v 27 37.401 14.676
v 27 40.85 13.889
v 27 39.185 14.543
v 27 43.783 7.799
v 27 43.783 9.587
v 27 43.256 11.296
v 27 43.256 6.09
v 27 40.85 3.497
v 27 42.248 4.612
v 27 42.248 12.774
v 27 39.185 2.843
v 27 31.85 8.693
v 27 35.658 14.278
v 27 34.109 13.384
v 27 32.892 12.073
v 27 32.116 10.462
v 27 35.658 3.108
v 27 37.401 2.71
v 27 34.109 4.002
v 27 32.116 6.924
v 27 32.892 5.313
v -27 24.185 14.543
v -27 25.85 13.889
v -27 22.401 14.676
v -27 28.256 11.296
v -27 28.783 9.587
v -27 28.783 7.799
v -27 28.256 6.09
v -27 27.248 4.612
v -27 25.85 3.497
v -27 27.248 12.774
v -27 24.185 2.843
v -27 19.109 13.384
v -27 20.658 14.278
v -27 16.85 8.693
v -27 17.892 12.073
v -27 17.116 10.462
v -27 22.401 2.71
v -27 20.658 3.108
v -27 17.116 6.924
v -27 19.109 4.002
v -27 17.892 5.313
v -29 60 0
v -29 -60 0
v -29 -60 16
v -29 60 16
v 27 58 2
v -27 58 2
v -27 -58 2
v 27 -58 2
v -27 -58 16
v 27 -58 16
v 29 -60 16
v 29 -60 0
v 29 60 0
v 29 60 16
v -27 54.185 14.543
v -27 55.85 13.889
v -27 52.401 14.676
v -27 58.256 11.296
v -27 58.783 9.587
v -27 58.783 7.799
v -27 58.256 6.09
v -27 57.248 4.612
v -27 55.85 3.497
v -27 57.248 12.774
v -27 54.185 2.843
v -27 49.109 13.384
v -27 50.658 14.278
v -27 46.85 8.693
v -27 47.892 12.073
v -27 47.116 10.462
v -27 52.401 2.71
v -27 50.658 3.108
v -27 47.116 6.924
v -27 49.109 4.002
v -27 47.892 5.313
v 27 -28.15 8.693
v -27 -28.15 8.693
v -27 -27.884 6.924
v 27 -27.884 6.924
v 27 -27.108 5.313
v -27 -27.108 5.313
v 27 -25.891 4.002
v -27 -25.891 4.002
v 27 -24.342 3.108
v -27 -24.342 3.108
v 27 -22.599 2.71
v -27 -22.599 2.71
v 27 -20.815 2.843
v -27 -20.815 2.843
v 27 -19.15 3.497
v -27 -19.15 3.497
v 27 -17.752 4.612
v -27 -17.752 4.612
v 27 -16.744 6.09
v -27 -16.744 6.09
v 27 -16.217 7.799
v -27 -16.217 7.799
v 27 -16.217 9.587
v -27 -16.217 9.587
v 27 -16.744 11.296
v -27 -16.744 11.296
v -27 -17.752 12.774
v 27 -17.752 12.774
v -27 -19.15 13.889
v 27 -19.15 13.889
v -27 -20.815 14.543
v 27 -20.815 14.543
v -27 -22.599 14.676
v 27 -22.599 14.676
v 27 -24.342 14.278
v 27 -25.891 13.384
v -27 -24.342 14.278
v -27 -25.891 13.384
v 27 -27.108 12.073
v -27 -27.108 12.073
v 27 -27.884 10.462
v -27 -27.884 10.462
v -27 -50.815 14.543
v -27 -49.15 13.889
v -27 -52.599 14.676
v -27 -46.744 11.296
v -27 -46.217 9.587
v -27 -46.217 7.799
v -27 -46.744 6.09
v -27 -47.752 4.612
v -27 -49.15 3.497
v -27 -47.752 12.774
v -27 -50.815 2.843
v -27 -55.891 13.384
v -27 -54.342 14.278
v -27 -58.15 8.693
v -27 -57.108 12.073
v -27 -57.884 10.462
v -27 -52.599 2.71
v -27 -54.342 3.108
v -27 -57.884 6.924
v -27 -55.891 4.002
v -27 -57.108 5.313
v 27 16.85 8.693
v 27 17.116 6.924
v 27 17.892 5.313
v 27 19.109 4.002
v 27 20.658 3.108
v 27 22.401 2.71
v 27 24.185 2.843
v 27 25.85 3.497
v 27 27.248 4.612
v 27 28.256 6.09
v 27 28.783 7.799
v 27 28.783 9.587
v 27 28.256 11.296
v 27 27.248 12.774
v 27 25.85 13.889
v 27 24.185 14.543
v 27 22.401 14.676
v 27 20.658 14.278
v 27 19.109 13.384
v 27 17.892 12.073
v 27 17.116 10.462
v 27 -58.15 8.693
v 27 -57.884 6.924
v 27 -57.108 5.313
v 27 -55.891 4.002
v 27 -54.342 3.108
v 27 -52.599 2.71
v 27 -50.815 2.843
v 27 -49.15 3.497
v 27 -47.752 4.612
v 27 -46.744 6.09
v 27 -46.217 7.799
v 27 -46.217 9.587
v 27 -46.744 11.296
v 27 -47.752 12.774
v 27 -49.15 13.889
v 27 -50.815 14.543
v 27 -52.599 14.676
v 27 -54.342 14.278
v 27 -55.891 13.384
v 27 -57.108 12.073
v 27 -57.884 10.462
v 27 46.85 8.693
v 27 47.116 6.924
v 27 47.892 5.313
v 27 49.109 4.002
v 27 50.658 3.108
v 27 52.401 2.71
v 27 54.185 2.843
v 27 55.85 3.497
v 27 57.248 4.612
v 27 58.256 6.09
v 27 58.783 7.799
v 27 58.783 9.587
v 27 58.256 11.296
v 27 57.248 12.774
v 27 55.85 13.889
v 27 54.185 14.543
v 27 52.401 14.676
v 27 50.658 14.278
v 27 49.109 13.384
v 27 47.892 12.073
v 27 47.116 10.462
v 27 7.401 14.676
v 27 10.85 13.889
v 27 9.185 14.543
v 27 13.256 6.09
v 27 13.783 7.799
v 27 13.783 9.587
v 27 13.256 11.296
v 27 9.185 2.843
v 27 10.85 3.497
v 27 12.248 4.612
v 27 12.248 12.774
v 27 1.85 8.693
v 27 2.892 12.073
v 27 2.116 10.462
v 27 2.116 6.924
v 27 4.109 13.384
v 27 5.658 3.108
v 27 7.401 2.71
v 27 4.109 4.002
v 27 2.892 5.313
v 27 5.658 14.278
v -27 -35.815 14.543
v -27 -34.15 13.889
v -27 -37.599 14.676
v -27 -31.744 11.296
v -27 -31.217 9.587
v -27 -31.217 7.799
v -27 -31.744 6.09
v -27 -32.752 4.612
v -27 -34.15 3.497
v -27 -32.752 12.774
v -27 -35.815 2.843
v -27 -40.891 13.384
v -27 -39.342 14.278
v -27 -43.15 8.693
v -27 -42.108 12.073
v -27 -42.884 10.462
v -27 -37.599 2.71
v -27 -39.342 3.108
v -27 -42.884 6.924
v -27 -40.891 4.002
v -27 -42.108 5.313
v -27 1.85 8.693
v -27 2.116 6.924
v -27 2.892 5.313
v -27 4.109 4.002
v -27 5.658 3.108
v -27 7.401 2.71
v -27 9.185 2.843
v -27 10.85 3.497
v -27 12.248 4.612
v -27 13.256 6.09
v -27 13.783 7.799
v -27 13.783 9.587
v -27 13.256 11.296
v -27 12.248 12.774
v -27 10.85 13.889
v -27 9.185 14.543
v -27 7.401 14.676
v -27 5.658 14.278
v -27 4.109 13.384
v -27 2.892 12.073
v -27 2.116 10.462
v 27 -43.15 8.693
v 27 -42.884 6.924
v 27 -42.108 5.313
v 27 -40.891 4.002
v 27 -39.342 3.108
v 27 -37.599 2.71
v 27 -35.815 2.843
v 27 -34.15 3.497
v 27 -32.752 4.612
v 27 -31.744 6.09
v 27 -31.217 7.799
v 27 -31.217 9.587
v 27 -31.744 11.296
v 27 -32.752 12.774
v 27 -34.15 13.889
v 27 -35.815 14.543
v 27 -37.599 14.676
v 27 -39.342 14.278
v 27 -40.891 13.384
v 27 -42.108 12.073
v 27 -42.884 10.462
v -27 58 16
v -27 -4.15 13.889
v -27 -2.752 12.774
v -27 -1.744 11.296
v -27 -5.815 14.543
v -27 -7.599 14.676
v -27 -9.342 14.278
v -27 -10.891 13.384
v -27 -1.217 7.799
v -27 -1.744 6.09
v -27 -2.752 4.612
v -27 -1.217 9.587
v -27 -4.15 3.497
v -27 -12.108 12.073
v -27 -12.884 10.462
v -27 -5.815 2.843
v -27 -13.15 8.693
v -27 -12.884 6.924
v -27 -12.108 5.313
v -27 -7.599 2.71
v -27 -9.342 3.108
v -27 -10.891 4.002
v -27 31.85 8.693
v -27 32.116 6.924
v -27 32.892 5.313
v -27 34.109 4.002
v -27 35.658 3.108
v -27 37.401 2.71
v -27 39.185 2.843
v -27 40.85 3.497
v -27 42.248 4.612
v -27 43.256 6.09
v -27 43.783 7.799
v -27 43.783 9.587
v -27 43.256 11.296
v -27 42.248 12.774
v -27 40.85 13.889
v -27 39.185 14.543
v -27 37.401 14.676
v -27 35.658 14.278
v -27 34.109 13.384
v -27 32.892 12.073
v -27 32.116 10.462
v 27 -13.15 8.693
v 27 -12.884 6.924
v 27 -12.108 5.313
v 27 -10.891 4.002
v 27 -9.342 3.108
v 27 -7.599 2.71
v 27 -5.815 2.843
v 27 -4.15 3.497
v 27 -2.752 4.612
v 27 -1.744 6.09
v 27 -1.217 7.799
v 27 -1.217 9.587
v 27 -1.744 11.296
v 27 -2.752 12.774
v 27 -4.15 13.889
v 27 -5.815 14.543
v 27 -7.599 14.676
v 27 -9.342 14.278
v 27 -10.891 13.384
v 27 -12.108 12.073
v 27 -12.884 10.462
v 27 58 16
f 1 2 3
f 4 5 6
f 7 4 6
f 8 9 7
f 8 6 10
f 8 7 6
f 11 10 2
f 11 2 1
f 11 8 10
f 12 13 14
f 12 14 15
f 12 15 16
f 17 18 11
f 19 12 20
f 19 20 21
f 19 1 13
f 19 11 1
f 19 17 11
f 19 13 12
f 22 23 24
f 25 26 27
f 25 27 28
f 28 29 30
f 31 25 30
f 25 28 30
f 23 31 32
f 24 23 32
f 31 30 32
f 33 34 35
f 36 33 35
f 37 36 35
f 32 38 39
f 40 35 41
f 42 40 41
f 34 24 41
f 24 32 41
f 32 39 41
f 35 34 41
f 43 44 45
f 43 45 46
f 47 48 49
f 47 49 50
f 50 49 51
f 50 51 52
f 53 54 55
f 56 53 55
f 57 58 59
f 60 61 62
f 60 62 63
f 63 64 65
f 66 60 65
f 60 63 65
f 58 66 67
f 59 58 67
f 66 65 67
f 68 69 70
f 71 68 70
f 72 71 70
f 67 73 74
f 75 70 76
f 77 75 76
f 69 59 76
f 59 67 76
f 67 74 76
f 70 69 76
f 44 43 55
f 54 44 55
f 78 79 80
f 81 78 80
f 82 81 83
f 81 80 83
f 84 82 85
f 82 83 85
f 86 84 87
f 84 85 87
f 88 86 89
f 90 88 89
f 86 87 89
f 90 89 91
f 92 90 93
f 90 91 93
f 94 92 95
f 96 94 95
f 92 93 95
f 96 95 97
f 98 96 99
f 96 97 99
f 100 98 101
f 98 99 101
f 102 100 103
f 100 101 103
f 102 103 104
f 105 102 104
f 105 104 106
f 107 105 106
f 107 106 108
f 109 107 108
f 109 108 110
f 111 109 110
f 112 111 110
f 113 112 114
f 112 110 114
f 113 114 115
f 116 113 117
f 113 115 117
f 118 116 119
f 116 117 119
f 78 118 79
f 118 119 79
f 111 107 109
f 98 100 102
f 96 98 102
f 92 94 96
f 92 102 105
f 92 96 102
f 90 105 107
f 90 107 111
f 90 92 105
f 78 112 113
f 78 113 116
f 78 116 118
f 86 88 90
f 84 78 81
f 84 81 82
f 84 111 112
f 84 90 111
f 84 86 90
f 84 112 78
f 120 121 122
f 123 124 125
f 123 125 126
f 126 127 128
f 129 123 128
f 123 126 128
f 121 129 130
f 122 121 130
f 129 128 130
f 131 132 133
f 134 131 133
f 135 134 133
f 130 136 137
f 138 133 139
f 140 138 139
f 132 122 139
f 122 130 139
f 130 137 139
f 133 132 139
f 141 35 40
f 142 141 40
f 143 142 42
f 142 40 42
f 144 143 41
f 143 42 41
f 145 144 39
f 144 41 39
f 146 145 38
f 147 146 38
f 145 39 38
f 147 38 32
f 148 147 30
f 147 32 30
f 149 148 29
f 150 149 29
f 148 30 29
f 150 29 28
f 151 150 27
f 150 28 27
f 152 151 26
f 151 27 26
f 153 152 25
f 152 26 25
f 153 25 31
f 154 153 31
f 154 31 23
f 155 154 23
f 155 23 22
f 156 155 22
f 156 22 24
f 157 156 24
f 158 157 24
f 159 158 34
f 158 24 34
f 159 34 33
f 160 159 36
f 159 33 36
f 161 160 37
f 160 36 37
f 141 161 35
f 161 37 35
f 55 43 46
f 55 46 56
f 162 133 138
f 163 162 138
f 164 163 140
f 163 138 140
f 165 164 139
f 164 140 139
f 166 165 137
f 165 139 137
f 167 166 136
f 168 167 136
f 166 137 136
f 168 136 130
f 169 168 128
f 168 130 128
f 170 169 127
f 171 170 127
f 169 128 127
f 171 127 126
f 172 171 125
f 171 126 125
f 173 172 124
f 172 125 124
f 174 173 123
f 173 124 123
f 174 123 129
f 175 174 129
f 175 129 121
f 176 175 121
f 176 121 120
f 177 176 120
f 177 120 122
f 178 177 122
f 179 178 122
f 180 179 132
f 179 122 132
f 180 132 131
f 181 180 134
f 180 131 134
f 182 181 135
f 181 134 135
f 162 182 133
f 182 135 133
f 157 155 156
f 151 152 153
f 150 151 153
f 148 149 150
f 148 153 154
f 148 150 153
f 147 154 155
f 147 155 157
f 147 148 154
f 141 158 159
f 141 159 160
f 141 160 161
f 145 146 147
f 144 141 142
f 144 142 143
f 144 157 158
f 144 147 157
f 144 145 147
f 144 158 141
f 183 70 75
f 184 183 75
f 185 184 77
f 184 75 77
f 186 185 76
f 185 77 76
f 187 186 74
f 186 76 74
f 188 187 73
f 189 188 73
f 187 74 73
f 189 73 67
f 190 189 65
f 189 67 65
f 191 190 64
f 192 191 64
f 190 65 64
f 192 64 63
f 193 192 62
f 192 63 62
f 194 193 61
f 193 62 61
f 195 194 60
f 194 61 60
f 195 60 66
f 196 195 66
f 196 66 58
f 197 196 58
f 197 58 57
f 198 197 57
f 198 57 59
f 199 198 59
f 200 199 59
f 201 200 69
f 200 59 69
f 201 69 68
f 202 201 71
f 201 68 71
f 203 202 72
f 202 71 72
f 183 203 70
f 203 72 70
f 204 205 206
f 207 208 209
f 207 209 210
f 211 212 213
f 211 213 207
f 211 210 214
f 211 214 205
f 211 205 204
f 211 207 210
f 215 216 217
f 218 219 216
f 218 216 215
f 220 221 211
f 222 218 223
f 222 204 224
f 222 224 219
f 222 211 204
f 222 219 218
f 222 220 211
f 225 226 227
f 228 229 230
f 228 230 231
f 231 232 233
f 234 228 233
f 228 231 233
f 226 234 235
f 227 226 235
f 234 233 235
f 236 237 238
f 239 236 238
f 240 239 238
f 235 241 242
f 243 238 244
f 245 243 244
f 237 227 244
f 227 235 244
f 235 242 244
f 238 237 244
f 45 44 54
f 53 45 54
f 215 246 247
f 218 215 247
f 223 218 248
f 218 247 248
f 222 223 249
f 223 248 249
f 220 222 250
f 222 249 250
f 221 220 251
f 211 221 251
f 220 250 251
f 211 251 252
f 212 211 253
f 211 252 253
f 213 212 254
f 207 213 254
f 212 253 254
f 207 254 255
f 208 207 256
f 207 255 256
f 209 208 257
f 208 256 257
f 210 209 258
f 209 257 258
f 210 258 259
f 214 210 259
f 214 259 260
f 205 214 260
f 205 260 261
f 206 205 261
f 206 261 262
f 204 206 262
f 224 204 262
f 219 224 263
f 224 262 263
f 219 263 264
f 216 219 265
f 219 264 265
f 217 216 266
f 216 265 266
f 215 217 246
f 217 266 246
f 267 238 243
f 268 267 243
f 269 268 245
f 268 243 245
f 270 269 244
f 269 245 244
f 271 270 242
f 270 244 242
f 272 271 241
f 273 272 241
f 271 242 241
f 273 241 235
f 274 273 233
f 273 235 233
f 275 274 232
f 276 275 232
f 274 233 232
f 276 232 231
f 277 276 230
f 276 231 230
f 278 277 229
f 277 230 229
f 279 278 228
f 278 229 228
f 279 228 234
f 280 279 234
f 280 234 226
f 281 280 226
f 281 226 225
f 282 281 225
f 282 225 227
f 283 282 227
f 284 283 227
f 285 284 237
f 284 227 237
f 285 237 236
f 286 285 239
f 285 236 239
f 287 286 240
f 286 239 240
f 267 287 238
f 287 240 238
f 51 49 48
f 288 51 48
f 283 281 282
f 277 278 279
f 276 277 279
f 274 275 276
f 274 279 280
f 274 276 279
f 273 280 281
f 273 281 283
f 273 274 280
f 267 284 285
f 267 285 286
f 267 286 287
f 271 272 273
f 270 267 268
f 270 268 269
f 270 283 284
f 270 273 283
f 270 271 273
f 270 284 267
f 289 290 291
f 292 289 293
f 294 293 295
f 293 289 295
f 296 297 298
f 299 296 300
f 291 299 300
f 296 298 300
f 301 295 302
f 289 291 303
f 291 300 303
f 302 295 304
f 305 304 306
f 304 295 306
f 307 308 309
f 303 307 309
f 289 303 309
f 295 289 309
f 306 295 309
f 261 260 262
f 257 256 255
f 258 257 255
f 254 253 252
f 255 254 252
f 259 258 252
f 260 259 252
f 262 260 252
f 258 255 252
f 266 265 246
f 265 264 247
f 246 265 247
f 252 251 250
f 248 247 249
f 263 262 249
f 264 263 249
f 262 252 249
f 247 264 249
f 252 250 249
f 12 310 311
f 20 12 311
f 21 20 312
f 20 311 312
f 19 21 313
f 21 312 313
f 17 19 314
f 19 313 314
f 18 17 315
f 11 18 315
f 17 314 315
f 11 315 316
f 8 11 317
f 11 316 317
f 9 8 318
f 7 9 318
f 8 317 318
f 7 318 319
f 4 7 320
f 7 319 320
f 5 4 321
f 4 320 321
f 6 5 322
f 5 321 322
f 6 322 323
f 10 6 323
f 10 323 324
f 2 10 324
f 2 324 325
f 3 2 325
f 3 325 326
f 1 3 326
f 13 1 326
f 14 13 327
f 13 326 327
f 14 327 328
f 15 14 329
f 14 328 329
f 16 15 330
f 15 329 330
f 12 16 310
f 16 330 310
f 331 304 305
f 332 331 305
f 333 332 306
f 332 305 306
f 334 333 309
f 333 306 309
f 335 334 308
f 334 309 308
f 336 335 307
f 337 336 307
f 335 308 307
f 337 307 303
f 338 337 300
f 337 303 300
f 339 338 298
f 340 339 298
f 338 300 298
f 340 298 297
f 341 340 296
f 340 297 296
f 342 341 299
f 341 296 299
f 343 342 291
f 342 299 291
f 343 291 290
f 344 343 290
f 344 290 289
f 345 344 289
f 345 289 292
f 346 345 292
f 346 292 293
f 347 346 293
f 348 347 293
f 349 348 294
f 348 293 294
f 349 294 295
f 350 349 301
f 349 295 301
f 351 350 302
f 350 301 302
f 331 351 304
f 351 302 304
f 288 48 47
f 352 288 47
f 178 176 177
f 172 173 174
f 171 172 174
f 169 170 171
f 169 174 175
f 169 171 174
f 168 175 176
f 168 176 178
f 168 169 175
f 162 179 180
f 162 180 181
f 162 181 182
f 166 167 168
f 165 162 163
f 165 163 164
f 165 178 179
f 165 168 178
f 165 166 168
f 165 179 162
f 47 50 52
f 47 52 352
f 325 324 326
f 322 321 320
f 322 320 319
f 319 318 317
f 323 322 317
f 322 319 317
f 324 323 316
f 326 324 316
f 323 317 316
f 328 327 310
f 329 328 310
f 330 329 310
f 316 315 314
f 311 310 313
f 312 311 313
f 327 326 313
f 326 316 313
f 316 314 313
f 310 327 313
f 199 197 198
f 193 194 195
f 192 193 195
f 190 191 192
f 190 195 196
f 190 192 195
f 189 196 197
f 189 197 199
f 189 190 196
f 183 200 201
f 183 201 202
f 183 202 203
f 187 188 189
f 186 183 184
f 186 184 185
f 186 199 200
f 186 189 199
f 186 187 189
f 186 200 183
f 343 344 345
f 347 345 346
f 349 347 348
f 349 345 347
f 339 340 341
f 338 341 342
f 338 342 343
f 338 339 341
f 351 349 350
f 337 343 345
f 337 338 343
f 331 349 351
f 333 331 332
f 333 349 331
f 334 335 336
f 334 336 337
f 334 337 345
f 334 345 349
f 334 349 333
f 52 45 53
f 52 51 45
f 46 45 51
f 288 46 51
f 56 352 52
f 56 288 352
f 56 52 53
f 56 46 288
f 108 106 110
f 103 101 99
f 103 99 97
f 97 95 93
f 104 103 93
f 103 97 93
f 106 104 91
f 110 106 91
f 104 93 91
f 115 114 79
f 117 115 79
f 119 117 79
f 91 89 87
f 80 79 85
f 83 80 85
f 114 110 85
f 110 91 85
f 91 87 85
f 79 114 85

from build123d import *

# Parameters (mm, degrees)
IZIM1_W                       = 58
IZIM1_H                       = 120
Y_KSEKLIK_EKSTR_ZYON1_DEPTH   = 16
BO_ALTMA1_T                   = -2
IZIM2_R                       = 6
Y_KSEKLIK_EKSTR_ZYON2_DEPTH   = 54
Y_KSEKLIK_EKSTR_ZYON2_2_DEPTH = 54
Y_KSEKLIK_EKSTR_ZYON2_3_DEPTH = 54
Y_KSEKLIK_EKSTR_ZYON2_4_DEPTH = 54
Y_KSEKLIK_EKSTR_ZYON2_5_DEPTH = 54
Y_KSEKLIK_EKSTR_ZYON2_6_DEPTH = 54
Y_KSEKLIK_EKSTR_ZYON2_7_DEPTH = 54
Y_KSEKLIK_EKSTR_ZYON2_8_DEPTH = 54


with BuildPart() as part:
    # Çizim1 → Yükseklik-Ekstrüzyon1 (new body)
    with BuildSketch(Plane.XY):
        Rectangle(IZIM1_W, IZIM1_H)
    extrude(amount=Y_KSEKLIK_EKSTR_ZYON1_DEPTH)

    # İç Boşaltma1
    bo_altma1_openings = [part.faces().sort_by_distance(p)[0] for p in [
        (0, 0, 16),
    ]]
    offset(amount=BO_ALTMA1_T, openings=bo_altma1_openings, kind=Kind.INTERSECTION)


with BuildPart() as body_2:
    # Çizim2 → Yükseklik-Ekstrüzyon2 (new body)
    with BuildSketch(Plane(origin=(-27, 0, 0), x_dir=(0, 0, -1), z_dir=(1, 0, 0))):
        with Locations(Location((-8.693027198, -52.150296616, 0), (0, 0, 270))):
            Circle(IZIM2_R)
    extrude(amount=Y_KSEKLIK_EKSTR_ZYON2_DEPTH)


with BuildPart() as body_3:
    # Çizim2 → Y_kseklik-Ekstr_zyon2 2 (new body)
    with BuildSketch(Plane(origin=(-27, 0, 0), x_dir=(0, 0, -1), z_dir=(1, 0, 0))):
        with Locations(Location((-8.693027198, -37.150296616, 0), (0, 0, 270))):
            Circle(IZIM2_R)
    extrude(amount=Y_KSEKLIK_EKSTR_ZYON2_2_DEPTH)


with BuildPart() as body_4:
    # Çizim2 → Y_kseklik-Ekstr_zyon2 3 (new body)
    with BuildSketch(Plane(origin=(-27, 0, 0), x_dir=(0, 0, -1), z_dir=(1, 0, 0))):
        with Locations(Location((-8.693027198, -22.150296616, 0), (0, 0, 270))):
            Circle(IZIM2_R)
    extrude(amount=Y_KSEKLIK_EKSTR_ZYON2_3_DEPTH)


with BuildPart() as body_5:
    # Çizim2 → Y_kseklik-Ekstr_zyon2 4 (new body)
    with BuildSketch(Plane(origin=(-27, 0, 0), x_dir=(0, 0, -1), z_dir=(1, 0, 0))):
        with Locations(Location((-8.693027198, -7.150296616, 0), (0, 0, 270))):
            Circle(IZIM2_R)
    extrude(amount=Y_KSEKLIK_EKSTR_ZYON2_4_DEPTH)


with BuildPart() as body_6:
    # Çizim2 → Y_kseklik-Ekstr_zyon2 5 (new body)
    with BuildSketch(Plane(origin=(-27, 0, 0), x_dir=(0, 0, -1), z_dir=(1, 0, 0))):
        with Locations(Location((-8.693027198, 7.849703384, 0), (0, 0, 270))):
            Circle(IZIM2_R)
    extrude(amount=Y_KSEKLIK_EKSTR_ZYON2_5_DEPTH)


with BuildPart() as body_7:
    # Çizim2 → Y_kseklik-Ekstr_zyon2 6 (new body)
    with BuildSketch(Plane(origin=(-27, 0, 0), x_dir=(0, 0, -1), z_dir=(1, 0, 0))):
        with Locations(Location((-8.693027198, 22.849703384, 0), (0, 0, 270))):
            Circle(IZIM2_R)
    extrude(amount=Y_KSEKLIK_EKSTR_ZYON2_6_DEPTH)


with BuildPart() as body_8:
    # Çizim2 → Y_kseklik-Ekstr_zyon2 7 (new body)
    with BuildSketch(Plane(origin=(-27, 0, 0), x_dir=(0, 0, -1), z_dir=(1, 0, 0))):
        with Locations(Location((-8.693027198, 37.849703384, 0), (0, 0, 270))):
            Circle(IZIM2_R)
    extrude(amount=Y_KSEKLIK_EKSTR_ZYON2_7_DEPTH)


with BuildPart() as body_9:
    # Çizim2 → Y_kseklik-Ekstr_zyon2 8 (new body)
    with BuildSketch(Plane(origin=(-27, 0, 0), x_dir=(0, 0, -1), z_dir=(1, 0, 0))):
        with Locations(Location((-8.693027198, 52.849703384, 0), (0, 0, 270))):
            Circle(IZIM2_R)
    extrude(amount=Y_KSEKLIK_EKSTR_ZYON2_8_DEPTH)


solid = Compound([part.part, body_2.part, body_3.part, body_4.part, body_5.part, body_6.part, body_7.part, body_8.part, body_9.part])
